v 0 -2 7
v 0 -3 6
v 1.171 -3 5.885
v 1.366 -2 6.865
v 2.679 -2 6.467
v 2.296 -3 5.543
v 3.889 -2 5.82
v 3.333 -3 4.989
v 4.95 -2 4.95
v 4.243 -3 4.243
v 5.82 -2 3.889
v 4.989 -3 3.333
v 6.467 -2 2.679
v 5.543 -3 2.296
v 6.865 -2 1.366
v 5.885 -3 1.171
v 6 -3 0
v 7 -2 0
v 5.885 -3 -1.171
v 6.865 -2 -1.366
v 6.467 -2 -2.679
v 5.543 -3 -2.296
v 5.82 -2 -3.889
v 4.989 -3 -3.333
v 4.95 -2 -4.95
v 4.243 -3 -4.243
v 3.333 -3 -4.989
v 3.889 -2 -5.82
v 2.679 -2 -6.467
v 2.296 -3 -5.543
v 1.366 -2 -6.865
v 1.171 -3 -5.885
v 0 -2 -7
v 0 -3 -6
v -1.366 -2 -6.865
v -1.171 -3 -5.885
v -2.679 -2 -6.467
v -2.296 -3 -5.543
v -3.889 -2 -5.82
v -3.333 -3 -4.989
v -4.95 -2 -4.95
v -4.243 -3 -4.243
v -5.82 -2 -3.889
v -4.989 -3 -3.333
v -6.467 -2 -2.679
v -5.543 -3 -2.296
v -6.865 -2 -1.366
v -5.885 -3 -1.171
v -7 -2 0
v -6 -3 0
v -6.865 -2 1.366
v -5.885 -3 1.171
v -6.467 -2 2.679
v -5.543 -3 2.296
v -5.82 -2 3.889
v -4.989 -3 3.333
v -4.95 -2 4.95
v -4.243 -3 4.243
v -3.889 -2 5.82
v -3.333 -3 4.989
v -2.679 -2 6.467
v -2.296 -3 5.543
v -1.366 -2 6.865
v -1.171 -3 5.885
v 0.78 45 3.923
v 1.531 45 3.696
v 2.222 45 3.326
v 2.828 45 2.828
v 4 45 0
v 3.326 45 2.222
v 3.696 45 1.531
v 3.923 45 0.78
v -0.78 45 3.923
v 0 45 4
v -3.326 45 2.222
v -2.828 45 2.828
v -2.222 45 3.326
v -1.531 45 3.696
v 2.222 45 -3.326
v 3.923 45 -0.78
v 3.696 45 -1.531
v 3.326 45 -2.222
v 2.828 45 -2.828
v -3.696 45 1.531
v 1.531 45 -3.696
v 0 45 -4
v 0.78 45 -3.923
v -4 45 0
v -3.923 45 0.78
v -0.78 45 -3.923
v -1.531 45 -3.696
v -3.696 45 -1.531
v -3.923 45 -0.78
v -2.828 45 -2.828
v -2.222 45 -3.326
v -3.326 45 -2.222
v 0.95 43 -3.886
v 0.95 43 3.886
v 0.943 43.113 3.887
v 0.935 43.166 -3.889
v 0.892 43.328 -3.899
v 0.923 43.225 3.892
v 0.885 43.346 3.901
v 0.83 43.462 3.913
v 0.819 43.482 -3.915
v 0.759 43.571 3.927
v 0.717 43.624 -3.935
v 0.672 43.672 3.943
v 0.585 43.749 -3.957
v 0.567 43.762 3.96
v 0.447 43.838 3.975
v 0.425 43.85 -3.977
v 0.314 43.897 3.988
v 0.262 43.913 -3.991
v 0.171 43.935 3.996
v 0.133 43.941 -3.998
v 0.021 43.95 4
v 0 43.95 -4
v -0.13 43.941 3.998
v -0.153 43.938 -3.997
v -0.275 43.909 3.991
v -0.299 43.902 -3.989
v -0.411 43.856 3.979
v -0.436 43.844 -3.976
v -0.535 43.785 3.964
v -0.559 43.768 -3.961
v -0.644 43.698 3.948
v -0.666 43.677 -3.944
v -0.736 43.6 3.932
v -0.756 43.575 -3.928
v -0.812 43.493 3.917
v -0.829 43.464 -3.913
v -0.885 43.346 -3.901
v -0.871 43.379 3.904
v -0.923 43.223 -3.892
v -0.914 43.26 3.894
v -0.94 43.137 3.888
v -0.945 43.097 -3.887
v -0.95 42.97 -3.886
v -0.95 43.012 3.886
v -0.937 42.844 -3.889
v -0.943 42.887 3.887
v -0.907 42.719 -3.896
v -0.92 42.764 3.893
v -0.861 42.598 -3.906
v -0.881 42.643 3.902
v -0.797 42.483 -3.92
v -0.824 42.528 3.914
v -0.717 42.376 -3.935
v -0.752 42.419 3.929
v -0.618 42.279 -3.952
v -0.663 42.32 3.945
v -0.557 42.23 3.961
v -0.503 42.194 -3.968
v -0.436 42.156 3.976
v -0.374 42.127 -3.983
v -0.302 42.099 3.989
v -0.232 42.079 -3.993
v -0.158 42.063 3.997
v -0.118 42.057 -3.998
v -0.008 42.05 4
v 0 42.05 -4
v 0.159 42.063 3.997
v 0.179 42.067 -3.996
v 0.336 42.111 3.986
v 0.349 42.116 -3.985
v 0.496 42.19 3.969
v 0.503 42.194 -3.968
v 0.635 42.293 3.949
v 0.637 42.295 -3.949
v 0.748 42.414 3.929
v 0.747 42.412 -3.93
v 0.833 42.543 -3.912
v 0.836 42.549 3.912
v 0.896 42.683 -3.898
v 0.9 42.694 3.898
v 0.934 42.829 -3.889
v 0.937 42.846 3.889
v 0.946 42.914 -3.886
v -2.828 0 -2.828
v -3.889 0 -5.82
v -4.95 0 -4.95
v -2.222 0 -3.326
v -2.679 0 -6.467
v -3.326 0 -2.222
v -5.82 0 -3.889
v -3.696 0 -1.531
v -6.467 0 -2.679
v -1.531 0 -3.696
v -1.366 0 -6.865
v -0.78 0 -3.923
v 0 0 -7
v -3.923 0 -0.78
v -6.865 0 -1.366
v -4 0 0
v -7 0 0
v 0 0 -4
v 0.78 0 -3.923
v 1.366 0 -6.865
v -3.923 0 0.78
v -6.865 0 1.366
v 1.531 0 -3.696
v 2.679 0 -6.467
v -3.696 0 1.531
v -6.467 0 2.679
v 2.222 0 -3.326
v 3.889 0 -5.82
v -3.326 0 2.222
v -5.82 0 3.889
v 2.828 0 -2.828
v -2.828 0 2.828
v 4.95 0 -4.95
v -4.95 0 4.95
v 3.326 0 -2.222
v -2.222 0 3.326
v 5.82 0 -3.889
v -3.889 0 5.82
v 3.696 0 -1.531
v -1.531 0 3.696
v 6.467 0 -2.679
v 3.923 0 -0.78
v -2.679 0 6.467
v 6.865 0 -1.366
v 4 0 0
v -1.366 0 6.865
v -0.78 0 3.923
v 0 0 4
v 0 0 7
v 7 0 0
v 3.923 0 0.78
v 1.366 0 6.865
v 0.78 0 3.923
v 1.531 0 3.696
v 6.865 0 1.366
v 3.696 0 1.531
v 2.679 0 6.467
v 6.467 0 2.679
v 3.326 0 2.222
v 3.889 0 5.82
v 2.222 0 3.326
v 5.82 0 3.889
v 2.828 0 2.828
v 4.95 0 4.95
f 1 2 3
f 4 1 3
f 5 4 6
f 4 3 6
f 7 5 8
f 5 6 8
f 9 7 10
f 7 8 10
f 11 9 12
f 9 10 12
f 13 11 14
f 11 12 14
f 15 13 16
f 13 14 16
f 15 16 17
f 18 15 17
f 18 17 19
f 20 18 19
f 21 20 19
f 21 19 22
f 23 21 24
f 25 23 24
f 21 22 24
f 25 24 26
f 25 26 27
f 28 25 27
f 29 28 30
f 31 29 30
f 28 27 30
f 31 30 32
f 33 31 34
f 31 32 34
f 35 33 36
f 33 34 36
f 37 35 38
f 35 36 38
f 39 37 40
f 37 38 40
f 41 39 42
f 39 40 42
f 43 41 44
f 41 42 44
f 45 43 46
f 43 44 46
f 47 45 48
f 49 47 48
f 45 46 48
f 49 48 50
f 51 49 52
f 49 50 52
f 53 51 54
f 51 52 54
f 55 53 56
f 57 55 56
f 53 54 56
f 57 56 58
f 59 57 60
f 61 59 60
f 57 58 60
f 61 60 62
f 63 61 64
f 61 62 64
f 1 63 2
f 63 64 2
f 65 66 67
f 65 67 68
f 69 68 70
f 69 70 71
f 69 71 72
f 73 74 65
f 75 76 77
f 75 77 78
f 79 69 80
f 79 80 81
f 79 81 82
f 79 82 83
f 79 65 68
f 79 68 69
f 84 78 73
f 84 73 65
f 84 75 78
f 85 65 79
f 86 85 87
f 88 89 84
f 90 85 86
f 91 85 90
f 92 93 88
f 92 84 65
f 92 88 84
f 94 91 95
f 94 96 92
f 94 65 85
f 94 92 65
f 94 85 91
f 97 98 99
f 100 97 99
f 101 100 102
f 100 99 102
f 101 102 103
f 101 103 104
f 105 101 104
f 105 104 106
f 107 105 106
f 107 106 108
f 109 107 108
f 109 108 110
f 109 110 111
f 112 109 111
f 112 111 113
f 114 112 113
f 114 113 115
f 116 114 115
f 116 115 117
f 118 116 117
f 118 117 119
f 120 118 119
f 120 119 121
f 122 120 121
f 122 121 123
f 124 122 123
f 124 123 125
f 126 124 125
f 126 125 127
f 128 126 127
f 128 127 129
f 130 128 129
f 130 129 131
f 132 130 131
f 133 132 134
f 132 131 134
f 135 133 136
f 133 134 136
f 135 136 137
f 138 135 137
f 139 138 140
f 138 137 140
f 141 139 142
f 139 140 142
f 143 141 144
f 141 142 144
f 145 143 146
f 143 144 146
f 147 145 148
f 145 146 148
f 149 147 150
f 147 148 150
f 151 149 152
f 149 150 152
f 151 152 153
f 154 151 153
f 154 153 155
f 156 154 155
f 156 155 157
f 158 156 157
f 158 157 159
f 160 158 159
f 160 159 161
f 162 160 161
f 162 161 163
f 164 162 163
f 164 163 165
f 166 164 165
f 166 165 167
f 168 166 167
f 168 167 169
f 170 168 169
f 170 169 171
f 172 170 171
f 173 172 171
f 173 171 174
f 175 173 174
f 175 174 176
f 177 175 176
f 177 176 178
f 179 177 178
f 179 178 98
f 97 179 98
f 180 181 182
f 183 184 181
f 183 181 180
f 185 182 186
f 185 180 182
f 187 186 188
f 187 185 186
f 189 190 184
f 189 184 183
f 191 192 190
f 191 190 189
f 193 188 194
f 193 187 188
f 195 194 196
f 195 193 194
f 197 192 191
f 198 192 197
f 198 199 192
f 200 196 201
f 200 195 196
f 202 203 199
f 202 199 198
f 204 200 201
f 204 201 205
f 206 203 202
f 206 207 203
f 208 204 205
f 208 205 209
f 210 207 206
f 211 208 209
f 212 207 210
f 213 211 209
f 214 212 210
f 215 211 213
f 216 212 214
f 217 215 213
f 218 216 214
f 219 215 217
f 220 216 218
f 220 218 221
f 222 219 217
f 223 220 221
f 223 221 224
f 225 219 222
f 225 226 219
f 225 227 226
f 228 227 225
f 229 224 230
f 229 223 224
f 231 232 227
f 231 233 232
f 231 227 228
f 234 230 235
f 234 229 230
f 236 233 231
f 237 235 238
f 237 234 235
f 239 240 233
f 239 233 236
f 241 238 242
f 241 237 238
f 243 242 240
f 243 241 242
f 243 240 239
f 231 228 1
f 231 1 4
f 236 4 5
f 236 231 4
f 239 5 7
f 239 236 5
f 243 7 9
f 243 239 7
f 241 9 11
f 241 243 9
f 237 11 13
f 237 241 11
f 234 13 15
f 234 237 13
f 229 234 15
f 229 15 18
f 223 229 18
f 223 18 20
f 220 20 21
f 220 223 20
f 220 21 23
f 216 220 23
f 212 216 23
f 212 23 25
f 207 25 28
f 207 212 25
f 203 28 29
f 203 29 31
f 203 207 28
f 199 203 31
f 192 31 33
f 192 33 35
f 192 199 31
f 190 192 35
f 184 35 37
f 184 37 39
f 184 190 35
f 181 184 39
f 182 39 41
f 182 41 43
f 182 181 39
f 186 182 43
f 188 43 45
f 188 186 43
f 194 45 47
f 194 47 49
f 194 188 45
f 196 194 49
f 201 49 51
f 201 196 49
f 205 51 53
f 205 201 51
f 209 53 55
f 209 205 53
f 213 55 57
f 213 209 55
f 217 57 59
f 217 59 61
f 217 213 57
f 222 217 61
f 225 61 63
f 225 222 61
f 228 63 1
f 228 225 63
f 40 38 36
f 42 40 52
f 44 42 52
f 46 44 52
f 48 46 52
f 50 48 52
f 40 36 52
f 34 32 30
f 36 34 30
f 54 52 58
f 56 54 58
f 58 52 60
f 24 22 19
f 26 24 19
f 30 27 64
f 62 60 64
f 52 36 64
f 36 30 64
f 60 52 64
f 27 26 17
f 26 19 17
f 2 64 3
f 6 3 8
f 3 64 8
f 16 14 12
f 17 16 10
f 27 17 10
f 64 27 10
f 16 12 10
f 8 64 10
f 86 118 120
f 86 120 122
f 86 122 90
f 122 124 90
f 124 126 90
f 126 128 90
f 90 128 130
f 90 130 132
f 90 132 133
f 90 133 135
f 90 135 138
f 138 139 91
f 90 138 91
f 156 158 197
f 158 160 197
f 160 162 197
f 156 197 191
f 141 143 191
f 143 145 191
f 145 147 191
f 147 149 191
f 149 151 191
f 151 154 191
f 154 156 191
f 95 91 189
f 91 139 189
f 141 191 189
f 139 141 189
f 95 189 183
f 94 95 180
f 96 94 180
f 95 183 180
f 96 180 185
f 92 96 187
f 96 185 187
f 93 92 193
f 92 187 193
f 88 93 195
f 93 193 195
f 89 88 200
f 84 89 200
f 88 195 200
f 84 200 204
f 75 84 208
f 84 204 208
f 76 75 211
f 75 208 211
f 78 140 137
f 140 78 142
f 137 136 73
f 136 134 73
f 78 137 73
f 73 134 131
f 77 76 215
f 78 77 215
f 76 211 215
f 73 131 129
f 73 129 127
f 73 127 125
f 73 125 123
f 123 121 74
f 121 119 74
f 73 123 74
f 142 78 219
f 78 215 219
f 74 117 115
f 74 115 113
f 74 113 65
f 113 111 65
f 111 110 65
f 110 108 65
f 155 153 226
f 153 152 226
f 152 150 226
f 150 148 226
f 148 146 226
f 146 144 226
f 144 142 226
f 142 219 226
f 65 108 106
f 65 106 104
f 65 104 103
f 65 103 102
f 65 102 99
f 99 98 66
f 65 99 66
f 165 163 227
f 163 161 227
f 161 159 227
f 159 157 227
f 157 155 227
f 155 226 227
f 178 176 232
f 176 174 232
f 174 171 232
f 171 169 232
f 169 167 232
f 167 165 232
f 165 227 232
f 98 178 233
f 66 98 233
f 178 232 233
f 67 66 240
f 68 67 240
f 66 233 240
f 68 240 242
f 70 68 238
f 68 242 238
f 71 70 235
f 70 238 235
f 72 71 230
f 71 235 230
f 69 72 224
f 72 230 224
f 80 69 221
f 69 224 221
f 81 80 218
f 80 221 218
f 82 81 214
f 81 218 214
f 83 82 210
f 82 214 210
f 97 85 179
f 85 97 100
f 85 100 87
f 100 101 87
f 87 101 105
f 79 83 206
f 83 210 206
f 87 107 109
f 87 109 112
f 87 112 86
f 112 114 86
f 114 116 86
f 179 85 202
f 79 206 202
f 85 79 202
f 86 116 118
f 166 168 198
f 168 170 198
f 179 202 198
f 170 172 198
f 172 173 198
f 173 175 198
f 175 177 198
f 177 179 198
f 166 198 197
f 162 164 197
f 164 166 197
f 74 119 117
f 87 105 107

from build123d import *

# Parameters (mm, degrees)
SKETCH1_R           = 7
BOSS_EXTRUDE1_DEPTH = 3
SKETCH1_3_R         = 4
BOSS_EXTRUDE2_DEPTH = 45
CHAMFER1_SIZE       = 1
CUT_EXTRUDE1_REACH  = 48.851
SKETCH2_R           = 0.95


with BuildPart() as part:
    # Sketch1 → Boss-Extrude1 (new body)
    with BuildSketch(Plane(origin=(0, 0, 0), x_dir=(1, 0, 0), z_dir=(0, 1, 0))):
        Circle(SKETCH1_R)
    extrude(amount=-BOSS_EXTRUDE1_DEPTH)

    # Sketch1<3> → Boss-Extrude2 (add)
    with BuildSketch(Plane(origin=(0, 0, 0), x_dir=(1, 0, 0), z_dir=(0, 1, 0))):
        Circle(SKETCH1_3_R)
    extrude(amount=BOSS_EXTRUDE2_DEPTH)

    # Chamfer1
    chamfer1_edges = [part.edges().sort_by_distance(p)[0] for p in [
        (-7, -3, 0),
    ]]
    chamfer(chamfer1_edges, length=CHAMFER1_SIZE)

    # Sketch2 → Cut-Extrude1 (cut, up to next)
    with BuildSketch(Plane.XY.offset(4), mode=Mode.PRIVATE) as cut_extrude1_sk1:
        with Locations((0, 43)):
            Circle(SKETCH2_R)
    cut_extrude1_tool1 = extrude(cut_extrude1_sk1.sketch, amount=-CUT_EXTRUDE1_REACH, mode=Mode.PRIVATE) & part.part
    add(cut_extrude1_tool1.solids().sort_by_distance((0, 43, 4))[0], mode=Mode.SUBTRACT)


solid = part.part
